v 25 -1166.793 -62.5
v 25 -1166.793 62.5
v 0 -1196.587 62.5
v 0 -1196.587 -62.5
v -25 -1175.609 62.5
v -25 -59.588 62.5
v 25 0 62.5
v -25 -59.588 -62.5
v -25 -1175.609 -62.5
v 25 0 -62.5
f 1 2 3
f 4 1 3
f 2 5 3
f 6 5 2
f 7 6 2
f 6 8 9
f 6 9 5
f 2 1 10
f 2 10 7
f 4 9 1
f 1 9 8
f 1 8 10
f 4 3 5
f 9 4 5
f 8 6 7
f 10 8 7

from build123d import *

# Parameters (mm, degrees)
F0_W     = 50
F0_H     = 125
F1_DEPTH = 1200
F3_DEPTH = 125
F5_DEPTH = 125


with BuildPart() as f1:
    # F0 (on Front) → F1 (new body)
    with BuildSketch(Plane.XZ):
        Rectangle(F0_W, F0_H)
    extrude(amount=F1_DEPTH)

    # F2 (on face) → F3 (cut, through all)
    with BuildSketch(Plane.XY.offset(62.5)):
        Polygon((-25, -59.58768), (25, 0), (-25, 0), align=None)
    extrude(amount=-F3_DEPTH, mode=Mode.SUBTRACT)

    # F4 (on face) → F5 (cut, through all)
    with BuildSketch(Plane.XY.offset(62.5)):
        Polygon((0, -1196.58671), (-25, -1175.609219), (-25, -1200), (25, -1200), (25, -1166.79287), align=None)
    extrude(amount=-F5_DEPTH, mode=Mode.SUBTRACT)


solid = f1.part
